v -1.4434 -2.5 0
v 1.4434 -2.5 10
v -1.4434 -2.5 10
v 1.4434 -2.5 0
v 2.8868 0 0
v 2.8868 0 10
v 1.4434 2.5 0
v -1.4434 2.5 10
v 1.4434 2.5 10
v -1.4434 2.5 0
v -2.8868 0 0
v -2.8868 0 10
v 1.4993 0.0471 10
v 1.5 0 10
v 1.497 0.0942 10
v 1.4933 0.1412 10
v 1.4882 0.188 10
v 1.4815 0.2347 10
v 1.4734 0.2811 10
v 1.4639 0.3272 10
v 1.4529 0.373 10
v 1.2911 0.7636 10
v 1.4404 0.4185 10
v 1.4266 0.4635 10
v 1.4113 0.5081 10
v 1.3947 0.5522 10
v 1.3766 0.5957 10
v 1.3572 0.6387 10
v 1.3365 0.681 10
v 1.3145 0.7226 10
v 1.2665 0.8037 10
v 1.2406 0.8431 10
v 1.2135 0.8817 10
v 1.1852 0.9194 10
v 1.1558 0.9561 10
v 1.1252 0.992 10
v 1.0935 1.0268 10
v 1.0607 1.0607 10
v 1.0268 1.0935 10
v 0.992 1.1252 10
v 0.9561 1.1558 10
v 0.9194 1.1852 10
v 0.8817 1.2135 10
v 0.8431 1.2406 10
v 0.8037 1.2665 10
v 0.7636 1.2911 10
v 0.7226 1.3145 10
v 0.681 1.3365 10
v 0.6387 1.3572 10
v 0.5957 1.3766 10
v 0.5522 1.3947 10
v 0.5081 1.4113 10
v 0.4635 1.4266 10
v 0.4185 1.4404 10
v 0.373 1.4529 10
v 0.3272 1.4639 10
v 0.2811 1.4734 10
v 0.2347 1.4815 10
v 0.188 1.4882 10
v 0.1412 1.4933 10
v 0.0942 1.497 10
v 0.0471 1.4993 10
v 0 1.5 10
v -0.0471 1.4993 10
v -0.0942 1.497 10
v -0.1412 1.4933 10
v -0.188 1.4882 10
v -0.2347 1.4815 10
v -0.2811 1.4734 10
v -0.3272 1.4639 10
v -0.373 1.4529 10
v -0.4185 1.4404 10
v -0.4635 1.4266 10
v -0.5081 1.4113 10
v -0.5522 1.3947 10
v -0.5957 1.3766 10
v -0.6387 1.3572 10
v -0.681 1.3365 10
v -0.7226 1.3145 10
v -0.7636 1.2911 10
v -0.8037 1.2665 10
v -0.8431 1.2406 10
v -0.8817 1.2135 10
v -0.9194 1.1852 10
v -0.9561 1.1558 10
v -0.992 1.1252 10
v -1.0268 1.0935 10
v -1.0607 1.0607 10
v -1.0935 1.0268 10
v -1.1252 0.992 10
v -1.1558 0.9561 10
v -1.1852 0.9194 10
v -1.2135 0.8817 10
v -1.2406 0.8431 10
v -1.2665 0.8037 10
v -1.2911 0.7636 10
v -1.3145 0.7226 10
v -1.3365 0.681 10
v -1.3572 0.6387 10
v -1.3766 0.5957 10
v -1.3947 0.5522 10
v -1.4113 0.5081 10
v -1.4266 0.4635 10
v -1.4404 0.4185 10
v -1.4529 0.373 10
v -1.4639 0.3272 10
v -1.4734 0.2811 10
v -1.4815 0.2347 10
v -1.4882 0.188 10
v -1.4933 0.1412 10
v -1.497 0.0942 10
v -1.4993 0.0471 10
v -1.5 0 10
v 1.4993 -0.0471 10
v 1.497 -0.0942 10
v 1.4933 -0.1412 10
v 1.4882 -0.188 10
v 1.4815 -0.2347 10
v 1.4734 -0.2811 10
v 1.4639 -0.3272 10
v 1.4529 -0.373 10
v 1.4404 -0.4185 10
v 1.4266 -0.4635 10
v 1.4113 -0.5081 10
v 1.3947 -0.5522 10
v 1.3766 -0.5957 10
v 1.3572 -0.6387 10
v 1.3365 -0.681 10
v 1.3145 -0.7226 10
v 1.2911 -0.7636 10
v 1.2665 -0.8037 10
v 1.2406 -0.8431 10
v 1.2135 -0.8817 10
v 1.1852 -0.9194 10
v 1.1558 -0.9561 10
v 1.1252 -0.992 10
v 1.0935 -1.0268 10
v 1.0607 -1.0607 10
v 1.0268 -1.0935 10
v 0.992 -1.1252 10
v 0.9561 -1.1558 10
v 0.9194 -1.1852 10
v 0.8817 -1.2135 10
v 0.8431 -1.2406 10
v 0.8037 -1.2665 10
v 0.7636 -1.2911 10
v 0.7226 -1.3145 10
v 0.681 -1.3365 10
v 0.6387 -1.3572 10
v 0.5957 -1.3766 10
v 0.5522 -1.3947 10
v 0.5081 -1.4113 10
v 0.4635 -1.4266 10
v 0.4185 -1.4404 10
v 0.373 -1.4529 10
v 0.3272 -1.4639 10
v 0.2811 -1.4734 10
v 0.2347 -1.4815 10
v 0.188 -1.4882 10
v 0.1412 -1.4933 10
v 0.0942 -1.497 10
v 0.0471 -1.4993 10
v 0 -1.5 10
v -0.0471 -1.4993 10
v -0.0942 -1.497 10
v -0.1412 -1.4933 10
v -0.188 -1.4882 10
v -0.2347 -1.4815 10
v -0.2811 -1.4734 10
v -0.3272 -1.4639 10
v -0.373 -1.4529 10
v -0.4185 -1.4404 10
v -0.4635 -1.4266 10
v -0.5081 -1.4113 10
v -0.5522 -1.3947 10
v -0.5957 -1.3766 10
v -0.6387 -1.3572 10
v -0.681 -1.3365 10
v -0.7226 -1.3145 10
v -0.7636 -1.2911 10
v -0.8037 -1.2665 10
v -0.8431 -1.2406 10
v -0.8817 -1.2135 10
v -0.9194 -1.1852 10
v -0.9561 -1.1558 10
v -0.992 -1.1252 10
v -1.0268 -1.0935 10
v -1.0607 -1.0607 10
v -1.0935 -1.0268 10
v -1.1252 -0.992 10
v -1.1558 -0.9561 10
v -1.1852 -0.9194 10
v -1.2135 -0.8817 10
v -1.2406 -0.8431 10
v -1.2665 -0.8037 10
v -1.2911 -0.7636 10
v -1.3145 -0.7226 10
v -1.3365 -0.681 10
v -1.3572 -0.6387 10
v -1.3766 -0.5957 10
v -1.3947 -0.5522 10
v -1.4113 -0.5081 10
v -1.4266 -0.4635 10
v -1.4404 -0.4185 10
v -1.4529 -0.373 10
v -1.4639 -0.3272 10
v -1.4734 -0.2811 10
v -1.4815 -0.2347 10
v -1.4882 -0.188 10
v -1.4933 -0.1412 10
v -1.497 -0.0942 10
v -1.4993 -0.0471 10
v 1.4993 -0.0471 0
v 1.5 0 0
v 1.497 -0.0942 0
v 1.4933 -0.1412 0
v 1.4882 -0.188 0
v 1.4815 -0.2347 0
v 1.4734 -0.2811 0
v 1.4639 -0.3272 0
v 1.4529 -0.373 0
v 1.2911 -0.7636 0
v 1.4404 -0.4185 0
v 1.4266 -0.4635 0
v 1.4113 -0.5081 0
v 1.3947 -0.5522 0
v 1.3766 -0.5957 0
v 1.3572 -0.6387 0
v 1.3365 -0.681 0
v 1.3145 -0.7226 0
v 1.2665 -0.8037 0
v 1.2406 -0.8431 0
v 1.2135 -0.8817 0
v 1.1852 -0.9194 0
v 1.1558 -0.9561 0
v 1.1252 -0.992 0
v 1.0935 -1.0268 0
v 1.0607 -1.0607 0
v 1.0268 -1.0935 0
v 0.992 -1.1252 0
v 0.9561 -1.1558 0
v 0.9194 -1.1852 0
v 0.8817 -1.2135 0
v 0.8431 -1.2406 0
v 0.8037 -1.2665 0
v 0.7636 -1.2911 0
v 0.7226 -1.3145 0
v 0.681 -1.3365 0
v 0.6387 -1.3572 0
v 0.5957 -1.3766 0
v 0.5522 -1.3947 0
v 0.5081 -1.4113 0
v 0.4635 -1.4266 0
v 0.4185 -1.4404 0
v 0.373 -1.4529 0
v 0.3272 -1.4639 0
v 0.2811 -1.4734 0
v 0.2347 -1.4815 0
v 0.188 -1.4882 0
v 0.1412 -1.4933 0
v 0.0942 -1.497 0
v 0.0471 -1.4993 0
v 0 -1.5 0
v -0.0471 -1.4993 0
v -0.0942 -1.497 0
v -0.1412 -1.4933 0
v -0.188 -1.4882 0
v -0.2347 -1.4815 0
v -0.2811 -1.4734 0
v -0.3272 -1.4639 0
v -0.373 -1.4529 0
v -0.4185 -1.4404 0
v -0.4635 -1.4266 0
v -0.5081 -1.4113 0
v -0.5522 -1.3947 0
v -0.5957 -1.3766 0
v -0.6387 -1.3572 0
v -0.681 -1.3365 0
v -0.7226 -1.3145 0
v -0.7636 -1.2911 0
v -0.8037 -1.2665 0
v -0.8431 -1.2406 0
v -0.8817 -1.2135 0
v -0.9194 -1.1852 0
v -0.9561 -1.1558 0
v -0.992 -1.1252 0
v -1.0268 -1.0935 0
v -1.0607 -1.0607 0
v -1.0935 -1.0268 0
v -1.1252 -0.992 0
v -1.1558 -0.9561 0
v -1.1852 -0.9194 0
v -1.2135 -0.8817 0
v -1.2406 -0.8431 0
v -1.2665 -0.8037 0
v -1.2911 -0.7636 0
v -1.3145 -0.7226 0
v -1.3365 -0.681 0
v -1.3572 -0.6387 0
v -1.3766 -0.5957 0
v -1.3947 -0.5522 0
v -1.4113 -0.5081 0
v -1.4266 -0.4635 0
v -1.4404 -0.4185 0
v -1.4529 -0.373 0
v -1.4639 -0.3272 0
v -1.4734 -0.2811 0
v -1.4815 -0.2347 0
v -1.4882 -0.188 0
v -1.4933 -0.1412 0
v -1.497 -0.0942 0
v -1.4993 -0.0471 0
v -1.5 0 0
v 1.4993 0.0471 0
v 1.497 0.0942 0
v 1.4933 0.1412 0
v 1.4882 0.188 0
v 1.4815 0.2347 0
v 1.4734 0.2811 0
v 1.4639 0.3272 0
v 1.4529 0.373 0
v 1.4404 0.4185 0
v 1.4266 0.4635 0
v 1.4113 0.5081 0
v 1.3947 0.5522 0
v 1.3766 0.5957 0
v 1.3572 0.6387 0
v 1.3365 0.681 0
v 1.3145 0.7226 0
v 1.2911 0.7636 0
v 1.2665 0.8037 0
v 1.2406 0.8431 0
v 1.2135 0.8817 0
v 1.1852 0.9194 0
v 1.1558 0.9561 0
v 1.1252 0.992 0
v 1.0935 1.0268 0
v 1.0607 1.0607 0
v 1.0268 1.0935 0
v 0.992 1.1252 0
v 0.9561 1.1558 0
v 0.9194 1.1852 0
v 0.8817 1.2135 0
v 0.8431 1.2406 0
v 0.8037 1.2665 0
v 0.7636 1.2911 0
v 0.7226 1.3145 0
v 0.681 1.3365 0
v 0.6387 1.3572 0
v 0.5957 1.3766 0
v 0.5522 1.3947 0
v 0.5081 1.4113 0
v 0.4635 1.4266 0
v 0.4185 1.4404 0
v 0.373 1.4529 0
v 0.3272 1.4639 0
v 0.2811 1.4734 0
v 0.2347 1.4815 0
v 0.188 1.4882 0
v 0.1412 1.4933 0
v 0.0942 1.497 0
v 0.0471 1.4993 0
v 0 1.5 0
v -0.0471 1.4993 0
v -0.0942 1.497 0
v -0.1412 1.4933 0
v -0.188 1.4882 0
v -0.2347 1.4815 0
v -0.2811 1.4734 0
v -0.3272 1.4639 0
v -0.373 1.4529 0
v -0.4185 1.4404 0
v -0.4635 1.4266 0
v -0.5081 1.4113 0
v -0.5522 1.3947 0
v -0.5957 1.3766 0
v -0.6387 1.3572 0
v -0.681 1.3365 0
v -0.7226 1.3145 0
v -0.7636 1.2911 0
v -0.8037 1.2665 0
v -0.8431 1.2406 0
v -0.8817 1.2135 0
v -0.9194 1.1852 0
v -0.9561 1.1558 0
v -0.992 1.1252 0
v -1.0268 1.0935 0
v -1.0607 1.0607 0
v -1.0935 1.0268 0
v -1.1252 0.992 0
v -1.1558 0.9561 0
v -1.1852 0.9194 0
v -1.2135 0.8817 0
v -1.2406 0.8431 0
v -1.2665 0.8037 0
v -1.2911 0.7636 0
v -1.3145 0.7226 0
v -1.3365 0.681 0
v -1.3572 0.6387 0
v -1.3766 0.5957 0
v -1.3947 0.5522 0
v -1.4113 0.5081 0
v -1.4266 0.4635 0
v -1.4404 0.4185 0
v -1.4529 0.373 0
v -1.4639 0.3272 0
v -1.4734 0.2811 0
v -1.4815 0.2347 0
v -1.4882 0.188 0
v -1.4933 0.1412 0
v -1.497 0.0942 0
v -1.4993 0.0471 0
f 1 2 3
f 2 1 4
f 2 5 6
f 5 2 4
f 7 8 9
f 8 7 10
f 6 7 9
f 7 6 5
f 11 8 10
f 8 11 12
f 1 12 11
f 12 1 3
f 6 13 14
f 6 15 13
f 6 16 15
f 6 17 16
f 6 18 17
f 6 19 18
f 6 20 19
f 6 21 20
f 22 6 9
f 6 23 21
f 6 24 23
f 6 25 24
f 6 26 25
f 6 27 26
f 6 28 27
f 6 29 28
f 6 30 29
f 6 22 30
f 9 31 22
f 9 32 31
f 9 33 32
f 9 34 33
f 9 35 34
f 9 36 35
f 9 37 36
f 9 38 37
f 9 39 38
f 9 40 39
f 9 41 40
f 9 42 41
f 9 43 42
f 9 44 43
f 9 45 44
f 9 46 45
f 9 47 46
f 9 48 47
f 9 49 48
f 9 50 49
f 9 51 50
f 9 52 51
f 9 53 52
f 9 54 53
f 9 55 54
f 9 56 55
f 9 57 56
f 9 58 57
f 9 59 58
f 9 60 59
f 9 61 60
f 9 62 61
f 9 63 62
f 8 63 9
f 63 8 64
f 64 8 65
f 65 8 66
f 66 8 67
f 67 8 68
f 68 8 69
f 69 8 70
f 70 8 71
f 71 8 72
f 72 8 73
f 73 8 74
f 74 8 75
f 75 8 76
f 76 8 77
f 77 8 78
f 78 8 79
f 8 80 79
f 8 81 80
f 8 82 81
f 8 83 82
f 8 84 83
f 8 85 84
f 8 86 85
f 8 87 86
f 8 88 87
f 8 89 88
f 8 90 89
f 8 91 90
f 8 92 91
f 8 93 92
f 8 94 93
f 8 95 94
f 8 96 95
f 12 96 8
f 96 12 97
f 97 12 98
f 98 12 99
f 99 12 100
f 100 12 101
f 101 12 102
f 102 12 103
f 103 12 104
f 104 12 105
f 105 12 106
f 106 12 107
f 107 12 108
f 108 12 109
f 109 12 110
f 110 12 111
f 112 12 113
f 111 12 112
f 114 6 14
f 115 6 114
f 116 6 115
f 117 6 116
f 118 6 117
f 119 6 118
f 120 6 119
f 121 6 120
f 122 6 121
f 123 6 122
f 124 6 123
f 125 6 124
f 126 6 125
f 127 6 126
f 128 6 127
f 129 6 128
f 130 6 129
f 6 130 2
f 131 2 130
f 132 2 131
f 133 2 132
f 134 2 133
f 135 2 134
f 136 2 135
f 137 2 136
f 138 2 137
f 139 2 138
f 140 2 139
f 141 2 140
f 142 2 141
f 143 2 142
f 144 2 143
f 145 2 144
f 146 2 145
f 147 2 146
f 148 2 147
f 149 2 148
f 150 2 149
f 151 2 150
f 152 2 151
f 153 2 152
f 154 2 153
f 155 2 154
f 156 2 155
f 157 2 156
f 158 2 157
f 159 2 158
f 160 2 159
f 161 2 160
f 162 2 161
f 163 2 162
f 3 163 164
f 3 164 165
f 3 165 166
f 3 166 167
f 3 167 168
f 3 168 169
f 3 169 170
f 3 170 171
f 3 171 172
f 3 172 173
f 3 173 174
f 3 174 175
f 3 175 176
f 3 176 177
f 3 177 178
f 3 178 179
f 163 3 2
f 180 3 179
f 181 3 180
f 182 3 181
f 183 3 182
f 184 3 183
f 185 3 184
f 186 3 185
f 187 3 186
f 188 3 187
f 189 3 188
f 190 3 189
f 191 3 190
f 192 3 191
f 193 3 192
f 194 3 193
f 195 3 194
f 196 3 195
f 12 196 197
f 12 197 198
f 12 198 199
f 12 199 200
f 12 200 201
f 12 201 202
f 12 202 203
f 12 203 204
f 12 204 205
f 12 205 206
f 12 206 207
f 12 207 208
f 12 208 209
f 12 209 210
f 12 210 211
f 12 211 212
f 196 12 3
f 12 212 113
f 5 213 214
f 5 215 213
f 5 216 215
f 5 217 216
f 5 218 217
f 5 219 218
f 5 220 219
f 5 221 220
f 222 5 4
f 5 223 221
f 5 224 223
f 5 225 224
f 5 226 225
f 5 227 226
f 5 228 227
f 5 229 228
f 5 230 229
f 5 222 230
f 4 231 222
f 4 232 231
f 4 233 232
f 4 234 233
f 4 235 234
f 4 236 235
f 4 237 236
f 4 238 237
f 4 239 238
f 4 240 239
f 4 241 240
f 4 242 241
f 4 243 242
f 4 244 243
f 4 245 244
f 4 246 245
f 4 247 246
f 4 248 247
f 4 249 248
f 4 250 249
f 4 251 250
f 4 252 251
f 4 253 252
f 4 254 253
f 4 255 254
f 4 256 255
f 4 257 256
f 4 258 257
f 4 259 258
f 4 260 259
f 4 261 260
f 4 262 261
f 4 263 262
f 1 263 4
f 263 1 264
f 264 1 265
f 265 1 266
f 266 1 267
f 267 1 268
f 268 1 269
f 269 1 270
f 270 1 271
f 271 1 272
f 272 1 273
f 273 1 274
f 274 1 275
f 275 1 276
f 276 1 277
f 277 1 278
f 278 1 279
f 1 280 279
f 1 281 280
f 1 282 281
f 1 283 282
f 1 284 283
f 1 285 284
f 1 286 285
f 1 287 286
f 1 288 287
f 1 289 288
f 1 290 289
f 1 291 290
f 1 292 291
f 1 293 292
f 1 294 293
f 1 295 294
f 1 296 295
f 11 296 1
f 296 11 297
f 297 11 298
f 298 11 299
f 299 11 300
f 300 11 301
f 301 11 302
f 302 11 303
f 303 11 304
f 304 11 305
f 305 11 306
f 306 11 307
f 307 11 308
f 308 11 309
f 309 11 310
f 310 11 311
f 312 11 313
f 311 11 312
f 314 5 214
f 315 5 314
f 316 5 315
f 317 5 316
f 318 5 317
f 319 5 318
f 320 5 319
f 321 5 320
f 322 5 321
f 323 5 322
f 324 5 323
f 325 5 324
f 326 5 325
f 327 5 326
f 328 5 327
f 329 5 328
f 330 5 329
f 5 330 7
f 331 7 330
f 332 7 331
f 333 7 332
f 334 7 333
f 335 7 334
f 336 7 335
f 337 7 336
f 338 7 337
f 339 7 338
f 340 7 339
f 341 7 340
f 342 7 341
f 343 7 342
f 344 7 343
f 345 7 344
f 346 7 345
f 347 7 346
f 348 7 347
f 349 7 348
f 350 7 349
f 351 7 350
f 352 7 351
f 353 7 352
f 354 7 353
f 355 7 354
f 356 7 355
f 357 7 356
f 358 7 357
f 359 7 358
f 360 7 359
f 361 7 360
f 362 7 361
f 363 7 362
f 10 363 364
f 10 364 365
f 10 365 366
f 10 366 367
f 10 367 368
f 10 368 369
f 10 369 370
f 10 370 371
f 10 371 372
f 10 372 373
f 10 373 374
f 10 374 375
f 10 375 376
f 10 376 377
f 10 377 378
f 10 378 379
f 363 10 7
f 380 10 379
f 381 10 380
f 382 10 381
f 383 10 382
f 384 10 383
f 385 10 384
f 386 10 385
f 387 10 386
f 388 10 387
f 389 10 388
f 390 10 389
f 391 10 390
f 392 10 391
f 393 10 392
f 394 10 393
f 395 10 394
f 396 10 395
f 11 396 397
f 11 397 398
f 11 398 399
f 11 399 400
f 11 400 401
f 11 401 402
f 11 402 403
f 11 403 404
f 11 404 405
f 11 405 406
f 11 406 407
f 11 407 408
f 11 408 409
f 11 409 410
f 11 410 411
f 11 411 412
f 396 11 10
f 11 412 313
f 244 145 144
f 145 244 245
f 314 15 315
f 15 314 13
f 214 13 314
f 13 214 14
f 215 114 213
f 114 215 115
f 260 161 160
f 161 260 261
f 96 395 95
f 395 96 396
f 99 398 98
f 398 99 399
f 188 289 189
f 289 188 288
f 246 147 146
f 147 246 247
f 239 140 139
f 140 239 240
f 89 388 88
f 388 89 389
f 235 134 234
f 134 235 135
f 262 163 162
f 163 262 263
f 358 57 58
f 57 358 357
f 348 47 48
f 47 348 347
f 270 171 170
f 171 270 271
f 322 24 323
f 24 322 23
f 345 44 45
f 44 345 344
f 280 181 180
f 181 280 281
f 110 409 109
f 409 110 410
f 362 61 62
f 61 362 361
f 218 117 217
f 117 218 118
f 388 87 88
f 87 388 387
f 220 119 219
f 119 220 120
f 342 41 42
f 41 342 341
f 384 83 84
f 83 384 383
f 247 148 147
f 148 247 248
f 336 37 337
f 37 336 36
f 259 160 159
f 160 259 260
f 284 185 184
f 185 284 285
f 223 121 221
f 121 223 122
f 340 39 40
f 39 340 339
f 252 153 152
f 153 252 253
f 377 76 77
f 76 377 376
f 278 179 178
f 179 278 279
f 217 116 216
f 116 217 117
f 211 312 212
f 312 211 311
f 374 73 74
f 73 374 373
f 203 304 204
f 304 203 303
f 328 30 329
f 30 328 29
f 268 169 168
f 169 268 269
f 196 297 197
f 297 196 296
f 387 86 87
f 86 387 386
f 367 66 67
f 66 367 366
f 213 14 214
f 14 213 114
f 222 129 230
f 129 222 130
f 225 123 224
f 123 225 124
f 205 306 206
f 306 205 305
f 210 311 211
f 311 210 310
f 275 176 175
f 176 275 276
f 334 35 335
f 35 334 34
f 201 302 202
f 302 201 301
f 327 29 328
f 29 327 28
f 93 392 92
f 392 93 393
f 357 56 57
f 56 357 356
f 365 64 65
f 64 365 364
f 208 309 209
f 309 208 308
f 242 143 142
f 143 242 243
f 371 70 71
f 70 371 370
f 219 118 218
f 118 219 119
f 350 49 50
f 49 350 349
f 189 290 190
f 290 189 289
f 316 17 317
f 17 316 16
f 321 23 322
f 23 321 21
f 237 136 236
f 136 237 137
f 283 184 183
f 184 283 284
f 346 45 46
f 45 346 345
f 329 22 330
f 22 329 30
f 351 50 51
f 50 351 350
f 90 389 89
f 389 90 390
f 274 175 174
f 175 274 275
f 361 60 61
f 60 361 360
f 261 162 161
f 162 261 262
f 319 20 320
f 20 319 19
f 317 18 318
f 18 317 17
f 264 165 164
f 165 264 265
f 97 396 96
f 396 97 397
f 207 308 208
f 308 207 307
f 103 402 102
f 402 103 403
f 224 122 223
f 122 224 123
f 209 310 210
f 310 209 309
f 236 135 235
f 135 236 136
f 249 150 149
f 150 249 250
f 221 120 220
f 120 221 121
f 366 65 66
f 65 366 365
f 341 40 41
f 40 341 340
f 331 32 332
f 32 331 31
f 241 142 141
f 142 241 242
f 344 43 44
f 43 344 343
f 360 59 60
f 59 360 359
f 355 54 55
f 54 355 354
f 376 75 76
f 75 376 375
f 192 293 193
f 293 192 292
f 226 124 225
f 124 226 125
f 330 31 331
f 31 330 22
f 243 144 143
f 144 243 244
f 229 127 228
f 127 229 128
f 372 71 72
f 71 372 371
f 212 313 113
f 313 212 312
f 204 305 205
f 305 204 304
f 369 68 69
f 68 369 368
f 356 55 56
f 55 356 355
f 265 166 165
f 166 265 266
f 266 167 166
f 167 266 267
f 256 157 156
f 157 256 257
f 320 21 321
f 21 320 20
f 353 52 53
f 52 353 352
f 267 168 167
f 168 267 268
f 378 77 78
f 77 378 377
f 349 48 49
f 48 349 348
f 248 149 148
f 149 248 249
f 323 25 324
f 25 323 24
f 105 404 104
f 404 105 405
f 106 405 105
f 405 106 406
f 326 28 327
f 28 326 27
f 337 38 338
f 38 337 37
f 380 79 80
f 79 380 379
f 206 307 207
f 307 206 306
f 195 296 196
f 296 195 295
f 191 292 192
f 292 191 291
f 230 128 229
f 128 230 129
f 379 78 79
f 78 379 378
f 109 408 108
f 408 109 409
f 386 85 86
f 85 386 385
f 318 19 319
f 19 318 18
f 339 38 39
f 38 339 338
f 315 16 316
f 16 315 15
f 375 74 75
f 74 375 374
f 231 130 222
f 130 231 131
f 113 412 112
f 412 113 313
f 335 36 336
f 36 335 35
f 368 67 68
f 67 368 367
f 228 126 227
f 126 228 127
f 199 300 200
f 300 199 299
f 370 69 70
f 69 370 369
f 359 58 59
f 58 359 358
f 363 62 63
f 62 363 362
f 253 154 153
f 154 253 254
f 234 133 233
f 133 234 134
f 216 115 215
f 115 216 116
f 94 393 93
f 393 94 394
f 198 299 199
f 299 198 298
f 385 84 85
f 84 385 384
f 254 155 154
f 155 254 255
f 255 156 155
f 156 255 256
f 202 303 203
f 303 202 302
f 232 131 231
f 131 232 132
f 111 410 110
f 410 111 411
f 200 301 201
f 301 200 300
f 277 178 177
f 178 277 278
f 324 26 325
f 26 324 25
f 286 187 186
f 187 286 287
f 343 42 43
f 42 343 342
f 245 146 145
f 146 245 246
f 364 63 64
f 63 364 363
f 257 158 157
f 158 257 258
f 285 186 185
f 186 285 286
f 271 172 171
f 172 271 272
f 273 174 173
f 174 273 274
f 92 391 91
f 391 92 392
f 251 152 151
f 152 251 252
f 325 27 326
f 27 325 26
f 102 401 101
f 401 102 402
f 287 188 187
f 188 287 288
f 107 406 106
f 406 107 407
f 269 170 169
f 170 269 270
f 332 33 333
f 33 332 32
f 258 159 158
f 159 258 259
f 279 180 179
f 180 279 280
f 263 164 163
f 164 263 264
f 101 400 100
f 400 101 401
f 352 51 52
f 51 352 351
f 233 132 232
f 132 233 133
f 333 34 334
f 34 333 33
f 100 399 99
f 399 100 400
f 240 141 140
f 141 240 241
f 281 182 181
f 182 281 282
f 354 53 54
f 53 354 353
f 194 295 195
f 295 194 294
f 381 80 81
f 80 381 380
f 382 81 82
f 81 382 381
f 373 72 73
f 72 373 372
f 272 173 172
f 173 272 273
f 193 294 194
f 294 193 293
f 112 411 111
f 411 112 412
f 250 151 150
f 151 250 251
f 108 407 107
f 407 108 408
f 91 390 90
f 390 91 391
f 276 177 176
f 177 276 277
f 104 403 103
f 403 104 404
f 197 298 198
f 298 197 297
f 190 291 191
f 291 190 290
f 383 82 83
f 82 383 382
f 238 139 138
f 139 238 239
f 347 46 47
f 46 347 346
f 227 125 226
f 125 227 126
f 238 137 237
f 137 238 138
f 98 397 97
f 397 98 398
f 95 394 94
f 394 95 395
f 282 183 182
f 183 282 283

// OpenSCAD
$fn = 200;

column (10, 0.8, 0.8, 0.8);

module column (column_height, r, g, b) {  
    color ([r, g, b, 1]) {
        difference () {
            cylinder (h = column_height, d = 4 * 2.5 / sqrt(3),
                      $fn = 6);
            translate ([0, 0, -0.5]) {
                cylinder (h = column_height + 1, d = 3);
            }
        }
    }
}
